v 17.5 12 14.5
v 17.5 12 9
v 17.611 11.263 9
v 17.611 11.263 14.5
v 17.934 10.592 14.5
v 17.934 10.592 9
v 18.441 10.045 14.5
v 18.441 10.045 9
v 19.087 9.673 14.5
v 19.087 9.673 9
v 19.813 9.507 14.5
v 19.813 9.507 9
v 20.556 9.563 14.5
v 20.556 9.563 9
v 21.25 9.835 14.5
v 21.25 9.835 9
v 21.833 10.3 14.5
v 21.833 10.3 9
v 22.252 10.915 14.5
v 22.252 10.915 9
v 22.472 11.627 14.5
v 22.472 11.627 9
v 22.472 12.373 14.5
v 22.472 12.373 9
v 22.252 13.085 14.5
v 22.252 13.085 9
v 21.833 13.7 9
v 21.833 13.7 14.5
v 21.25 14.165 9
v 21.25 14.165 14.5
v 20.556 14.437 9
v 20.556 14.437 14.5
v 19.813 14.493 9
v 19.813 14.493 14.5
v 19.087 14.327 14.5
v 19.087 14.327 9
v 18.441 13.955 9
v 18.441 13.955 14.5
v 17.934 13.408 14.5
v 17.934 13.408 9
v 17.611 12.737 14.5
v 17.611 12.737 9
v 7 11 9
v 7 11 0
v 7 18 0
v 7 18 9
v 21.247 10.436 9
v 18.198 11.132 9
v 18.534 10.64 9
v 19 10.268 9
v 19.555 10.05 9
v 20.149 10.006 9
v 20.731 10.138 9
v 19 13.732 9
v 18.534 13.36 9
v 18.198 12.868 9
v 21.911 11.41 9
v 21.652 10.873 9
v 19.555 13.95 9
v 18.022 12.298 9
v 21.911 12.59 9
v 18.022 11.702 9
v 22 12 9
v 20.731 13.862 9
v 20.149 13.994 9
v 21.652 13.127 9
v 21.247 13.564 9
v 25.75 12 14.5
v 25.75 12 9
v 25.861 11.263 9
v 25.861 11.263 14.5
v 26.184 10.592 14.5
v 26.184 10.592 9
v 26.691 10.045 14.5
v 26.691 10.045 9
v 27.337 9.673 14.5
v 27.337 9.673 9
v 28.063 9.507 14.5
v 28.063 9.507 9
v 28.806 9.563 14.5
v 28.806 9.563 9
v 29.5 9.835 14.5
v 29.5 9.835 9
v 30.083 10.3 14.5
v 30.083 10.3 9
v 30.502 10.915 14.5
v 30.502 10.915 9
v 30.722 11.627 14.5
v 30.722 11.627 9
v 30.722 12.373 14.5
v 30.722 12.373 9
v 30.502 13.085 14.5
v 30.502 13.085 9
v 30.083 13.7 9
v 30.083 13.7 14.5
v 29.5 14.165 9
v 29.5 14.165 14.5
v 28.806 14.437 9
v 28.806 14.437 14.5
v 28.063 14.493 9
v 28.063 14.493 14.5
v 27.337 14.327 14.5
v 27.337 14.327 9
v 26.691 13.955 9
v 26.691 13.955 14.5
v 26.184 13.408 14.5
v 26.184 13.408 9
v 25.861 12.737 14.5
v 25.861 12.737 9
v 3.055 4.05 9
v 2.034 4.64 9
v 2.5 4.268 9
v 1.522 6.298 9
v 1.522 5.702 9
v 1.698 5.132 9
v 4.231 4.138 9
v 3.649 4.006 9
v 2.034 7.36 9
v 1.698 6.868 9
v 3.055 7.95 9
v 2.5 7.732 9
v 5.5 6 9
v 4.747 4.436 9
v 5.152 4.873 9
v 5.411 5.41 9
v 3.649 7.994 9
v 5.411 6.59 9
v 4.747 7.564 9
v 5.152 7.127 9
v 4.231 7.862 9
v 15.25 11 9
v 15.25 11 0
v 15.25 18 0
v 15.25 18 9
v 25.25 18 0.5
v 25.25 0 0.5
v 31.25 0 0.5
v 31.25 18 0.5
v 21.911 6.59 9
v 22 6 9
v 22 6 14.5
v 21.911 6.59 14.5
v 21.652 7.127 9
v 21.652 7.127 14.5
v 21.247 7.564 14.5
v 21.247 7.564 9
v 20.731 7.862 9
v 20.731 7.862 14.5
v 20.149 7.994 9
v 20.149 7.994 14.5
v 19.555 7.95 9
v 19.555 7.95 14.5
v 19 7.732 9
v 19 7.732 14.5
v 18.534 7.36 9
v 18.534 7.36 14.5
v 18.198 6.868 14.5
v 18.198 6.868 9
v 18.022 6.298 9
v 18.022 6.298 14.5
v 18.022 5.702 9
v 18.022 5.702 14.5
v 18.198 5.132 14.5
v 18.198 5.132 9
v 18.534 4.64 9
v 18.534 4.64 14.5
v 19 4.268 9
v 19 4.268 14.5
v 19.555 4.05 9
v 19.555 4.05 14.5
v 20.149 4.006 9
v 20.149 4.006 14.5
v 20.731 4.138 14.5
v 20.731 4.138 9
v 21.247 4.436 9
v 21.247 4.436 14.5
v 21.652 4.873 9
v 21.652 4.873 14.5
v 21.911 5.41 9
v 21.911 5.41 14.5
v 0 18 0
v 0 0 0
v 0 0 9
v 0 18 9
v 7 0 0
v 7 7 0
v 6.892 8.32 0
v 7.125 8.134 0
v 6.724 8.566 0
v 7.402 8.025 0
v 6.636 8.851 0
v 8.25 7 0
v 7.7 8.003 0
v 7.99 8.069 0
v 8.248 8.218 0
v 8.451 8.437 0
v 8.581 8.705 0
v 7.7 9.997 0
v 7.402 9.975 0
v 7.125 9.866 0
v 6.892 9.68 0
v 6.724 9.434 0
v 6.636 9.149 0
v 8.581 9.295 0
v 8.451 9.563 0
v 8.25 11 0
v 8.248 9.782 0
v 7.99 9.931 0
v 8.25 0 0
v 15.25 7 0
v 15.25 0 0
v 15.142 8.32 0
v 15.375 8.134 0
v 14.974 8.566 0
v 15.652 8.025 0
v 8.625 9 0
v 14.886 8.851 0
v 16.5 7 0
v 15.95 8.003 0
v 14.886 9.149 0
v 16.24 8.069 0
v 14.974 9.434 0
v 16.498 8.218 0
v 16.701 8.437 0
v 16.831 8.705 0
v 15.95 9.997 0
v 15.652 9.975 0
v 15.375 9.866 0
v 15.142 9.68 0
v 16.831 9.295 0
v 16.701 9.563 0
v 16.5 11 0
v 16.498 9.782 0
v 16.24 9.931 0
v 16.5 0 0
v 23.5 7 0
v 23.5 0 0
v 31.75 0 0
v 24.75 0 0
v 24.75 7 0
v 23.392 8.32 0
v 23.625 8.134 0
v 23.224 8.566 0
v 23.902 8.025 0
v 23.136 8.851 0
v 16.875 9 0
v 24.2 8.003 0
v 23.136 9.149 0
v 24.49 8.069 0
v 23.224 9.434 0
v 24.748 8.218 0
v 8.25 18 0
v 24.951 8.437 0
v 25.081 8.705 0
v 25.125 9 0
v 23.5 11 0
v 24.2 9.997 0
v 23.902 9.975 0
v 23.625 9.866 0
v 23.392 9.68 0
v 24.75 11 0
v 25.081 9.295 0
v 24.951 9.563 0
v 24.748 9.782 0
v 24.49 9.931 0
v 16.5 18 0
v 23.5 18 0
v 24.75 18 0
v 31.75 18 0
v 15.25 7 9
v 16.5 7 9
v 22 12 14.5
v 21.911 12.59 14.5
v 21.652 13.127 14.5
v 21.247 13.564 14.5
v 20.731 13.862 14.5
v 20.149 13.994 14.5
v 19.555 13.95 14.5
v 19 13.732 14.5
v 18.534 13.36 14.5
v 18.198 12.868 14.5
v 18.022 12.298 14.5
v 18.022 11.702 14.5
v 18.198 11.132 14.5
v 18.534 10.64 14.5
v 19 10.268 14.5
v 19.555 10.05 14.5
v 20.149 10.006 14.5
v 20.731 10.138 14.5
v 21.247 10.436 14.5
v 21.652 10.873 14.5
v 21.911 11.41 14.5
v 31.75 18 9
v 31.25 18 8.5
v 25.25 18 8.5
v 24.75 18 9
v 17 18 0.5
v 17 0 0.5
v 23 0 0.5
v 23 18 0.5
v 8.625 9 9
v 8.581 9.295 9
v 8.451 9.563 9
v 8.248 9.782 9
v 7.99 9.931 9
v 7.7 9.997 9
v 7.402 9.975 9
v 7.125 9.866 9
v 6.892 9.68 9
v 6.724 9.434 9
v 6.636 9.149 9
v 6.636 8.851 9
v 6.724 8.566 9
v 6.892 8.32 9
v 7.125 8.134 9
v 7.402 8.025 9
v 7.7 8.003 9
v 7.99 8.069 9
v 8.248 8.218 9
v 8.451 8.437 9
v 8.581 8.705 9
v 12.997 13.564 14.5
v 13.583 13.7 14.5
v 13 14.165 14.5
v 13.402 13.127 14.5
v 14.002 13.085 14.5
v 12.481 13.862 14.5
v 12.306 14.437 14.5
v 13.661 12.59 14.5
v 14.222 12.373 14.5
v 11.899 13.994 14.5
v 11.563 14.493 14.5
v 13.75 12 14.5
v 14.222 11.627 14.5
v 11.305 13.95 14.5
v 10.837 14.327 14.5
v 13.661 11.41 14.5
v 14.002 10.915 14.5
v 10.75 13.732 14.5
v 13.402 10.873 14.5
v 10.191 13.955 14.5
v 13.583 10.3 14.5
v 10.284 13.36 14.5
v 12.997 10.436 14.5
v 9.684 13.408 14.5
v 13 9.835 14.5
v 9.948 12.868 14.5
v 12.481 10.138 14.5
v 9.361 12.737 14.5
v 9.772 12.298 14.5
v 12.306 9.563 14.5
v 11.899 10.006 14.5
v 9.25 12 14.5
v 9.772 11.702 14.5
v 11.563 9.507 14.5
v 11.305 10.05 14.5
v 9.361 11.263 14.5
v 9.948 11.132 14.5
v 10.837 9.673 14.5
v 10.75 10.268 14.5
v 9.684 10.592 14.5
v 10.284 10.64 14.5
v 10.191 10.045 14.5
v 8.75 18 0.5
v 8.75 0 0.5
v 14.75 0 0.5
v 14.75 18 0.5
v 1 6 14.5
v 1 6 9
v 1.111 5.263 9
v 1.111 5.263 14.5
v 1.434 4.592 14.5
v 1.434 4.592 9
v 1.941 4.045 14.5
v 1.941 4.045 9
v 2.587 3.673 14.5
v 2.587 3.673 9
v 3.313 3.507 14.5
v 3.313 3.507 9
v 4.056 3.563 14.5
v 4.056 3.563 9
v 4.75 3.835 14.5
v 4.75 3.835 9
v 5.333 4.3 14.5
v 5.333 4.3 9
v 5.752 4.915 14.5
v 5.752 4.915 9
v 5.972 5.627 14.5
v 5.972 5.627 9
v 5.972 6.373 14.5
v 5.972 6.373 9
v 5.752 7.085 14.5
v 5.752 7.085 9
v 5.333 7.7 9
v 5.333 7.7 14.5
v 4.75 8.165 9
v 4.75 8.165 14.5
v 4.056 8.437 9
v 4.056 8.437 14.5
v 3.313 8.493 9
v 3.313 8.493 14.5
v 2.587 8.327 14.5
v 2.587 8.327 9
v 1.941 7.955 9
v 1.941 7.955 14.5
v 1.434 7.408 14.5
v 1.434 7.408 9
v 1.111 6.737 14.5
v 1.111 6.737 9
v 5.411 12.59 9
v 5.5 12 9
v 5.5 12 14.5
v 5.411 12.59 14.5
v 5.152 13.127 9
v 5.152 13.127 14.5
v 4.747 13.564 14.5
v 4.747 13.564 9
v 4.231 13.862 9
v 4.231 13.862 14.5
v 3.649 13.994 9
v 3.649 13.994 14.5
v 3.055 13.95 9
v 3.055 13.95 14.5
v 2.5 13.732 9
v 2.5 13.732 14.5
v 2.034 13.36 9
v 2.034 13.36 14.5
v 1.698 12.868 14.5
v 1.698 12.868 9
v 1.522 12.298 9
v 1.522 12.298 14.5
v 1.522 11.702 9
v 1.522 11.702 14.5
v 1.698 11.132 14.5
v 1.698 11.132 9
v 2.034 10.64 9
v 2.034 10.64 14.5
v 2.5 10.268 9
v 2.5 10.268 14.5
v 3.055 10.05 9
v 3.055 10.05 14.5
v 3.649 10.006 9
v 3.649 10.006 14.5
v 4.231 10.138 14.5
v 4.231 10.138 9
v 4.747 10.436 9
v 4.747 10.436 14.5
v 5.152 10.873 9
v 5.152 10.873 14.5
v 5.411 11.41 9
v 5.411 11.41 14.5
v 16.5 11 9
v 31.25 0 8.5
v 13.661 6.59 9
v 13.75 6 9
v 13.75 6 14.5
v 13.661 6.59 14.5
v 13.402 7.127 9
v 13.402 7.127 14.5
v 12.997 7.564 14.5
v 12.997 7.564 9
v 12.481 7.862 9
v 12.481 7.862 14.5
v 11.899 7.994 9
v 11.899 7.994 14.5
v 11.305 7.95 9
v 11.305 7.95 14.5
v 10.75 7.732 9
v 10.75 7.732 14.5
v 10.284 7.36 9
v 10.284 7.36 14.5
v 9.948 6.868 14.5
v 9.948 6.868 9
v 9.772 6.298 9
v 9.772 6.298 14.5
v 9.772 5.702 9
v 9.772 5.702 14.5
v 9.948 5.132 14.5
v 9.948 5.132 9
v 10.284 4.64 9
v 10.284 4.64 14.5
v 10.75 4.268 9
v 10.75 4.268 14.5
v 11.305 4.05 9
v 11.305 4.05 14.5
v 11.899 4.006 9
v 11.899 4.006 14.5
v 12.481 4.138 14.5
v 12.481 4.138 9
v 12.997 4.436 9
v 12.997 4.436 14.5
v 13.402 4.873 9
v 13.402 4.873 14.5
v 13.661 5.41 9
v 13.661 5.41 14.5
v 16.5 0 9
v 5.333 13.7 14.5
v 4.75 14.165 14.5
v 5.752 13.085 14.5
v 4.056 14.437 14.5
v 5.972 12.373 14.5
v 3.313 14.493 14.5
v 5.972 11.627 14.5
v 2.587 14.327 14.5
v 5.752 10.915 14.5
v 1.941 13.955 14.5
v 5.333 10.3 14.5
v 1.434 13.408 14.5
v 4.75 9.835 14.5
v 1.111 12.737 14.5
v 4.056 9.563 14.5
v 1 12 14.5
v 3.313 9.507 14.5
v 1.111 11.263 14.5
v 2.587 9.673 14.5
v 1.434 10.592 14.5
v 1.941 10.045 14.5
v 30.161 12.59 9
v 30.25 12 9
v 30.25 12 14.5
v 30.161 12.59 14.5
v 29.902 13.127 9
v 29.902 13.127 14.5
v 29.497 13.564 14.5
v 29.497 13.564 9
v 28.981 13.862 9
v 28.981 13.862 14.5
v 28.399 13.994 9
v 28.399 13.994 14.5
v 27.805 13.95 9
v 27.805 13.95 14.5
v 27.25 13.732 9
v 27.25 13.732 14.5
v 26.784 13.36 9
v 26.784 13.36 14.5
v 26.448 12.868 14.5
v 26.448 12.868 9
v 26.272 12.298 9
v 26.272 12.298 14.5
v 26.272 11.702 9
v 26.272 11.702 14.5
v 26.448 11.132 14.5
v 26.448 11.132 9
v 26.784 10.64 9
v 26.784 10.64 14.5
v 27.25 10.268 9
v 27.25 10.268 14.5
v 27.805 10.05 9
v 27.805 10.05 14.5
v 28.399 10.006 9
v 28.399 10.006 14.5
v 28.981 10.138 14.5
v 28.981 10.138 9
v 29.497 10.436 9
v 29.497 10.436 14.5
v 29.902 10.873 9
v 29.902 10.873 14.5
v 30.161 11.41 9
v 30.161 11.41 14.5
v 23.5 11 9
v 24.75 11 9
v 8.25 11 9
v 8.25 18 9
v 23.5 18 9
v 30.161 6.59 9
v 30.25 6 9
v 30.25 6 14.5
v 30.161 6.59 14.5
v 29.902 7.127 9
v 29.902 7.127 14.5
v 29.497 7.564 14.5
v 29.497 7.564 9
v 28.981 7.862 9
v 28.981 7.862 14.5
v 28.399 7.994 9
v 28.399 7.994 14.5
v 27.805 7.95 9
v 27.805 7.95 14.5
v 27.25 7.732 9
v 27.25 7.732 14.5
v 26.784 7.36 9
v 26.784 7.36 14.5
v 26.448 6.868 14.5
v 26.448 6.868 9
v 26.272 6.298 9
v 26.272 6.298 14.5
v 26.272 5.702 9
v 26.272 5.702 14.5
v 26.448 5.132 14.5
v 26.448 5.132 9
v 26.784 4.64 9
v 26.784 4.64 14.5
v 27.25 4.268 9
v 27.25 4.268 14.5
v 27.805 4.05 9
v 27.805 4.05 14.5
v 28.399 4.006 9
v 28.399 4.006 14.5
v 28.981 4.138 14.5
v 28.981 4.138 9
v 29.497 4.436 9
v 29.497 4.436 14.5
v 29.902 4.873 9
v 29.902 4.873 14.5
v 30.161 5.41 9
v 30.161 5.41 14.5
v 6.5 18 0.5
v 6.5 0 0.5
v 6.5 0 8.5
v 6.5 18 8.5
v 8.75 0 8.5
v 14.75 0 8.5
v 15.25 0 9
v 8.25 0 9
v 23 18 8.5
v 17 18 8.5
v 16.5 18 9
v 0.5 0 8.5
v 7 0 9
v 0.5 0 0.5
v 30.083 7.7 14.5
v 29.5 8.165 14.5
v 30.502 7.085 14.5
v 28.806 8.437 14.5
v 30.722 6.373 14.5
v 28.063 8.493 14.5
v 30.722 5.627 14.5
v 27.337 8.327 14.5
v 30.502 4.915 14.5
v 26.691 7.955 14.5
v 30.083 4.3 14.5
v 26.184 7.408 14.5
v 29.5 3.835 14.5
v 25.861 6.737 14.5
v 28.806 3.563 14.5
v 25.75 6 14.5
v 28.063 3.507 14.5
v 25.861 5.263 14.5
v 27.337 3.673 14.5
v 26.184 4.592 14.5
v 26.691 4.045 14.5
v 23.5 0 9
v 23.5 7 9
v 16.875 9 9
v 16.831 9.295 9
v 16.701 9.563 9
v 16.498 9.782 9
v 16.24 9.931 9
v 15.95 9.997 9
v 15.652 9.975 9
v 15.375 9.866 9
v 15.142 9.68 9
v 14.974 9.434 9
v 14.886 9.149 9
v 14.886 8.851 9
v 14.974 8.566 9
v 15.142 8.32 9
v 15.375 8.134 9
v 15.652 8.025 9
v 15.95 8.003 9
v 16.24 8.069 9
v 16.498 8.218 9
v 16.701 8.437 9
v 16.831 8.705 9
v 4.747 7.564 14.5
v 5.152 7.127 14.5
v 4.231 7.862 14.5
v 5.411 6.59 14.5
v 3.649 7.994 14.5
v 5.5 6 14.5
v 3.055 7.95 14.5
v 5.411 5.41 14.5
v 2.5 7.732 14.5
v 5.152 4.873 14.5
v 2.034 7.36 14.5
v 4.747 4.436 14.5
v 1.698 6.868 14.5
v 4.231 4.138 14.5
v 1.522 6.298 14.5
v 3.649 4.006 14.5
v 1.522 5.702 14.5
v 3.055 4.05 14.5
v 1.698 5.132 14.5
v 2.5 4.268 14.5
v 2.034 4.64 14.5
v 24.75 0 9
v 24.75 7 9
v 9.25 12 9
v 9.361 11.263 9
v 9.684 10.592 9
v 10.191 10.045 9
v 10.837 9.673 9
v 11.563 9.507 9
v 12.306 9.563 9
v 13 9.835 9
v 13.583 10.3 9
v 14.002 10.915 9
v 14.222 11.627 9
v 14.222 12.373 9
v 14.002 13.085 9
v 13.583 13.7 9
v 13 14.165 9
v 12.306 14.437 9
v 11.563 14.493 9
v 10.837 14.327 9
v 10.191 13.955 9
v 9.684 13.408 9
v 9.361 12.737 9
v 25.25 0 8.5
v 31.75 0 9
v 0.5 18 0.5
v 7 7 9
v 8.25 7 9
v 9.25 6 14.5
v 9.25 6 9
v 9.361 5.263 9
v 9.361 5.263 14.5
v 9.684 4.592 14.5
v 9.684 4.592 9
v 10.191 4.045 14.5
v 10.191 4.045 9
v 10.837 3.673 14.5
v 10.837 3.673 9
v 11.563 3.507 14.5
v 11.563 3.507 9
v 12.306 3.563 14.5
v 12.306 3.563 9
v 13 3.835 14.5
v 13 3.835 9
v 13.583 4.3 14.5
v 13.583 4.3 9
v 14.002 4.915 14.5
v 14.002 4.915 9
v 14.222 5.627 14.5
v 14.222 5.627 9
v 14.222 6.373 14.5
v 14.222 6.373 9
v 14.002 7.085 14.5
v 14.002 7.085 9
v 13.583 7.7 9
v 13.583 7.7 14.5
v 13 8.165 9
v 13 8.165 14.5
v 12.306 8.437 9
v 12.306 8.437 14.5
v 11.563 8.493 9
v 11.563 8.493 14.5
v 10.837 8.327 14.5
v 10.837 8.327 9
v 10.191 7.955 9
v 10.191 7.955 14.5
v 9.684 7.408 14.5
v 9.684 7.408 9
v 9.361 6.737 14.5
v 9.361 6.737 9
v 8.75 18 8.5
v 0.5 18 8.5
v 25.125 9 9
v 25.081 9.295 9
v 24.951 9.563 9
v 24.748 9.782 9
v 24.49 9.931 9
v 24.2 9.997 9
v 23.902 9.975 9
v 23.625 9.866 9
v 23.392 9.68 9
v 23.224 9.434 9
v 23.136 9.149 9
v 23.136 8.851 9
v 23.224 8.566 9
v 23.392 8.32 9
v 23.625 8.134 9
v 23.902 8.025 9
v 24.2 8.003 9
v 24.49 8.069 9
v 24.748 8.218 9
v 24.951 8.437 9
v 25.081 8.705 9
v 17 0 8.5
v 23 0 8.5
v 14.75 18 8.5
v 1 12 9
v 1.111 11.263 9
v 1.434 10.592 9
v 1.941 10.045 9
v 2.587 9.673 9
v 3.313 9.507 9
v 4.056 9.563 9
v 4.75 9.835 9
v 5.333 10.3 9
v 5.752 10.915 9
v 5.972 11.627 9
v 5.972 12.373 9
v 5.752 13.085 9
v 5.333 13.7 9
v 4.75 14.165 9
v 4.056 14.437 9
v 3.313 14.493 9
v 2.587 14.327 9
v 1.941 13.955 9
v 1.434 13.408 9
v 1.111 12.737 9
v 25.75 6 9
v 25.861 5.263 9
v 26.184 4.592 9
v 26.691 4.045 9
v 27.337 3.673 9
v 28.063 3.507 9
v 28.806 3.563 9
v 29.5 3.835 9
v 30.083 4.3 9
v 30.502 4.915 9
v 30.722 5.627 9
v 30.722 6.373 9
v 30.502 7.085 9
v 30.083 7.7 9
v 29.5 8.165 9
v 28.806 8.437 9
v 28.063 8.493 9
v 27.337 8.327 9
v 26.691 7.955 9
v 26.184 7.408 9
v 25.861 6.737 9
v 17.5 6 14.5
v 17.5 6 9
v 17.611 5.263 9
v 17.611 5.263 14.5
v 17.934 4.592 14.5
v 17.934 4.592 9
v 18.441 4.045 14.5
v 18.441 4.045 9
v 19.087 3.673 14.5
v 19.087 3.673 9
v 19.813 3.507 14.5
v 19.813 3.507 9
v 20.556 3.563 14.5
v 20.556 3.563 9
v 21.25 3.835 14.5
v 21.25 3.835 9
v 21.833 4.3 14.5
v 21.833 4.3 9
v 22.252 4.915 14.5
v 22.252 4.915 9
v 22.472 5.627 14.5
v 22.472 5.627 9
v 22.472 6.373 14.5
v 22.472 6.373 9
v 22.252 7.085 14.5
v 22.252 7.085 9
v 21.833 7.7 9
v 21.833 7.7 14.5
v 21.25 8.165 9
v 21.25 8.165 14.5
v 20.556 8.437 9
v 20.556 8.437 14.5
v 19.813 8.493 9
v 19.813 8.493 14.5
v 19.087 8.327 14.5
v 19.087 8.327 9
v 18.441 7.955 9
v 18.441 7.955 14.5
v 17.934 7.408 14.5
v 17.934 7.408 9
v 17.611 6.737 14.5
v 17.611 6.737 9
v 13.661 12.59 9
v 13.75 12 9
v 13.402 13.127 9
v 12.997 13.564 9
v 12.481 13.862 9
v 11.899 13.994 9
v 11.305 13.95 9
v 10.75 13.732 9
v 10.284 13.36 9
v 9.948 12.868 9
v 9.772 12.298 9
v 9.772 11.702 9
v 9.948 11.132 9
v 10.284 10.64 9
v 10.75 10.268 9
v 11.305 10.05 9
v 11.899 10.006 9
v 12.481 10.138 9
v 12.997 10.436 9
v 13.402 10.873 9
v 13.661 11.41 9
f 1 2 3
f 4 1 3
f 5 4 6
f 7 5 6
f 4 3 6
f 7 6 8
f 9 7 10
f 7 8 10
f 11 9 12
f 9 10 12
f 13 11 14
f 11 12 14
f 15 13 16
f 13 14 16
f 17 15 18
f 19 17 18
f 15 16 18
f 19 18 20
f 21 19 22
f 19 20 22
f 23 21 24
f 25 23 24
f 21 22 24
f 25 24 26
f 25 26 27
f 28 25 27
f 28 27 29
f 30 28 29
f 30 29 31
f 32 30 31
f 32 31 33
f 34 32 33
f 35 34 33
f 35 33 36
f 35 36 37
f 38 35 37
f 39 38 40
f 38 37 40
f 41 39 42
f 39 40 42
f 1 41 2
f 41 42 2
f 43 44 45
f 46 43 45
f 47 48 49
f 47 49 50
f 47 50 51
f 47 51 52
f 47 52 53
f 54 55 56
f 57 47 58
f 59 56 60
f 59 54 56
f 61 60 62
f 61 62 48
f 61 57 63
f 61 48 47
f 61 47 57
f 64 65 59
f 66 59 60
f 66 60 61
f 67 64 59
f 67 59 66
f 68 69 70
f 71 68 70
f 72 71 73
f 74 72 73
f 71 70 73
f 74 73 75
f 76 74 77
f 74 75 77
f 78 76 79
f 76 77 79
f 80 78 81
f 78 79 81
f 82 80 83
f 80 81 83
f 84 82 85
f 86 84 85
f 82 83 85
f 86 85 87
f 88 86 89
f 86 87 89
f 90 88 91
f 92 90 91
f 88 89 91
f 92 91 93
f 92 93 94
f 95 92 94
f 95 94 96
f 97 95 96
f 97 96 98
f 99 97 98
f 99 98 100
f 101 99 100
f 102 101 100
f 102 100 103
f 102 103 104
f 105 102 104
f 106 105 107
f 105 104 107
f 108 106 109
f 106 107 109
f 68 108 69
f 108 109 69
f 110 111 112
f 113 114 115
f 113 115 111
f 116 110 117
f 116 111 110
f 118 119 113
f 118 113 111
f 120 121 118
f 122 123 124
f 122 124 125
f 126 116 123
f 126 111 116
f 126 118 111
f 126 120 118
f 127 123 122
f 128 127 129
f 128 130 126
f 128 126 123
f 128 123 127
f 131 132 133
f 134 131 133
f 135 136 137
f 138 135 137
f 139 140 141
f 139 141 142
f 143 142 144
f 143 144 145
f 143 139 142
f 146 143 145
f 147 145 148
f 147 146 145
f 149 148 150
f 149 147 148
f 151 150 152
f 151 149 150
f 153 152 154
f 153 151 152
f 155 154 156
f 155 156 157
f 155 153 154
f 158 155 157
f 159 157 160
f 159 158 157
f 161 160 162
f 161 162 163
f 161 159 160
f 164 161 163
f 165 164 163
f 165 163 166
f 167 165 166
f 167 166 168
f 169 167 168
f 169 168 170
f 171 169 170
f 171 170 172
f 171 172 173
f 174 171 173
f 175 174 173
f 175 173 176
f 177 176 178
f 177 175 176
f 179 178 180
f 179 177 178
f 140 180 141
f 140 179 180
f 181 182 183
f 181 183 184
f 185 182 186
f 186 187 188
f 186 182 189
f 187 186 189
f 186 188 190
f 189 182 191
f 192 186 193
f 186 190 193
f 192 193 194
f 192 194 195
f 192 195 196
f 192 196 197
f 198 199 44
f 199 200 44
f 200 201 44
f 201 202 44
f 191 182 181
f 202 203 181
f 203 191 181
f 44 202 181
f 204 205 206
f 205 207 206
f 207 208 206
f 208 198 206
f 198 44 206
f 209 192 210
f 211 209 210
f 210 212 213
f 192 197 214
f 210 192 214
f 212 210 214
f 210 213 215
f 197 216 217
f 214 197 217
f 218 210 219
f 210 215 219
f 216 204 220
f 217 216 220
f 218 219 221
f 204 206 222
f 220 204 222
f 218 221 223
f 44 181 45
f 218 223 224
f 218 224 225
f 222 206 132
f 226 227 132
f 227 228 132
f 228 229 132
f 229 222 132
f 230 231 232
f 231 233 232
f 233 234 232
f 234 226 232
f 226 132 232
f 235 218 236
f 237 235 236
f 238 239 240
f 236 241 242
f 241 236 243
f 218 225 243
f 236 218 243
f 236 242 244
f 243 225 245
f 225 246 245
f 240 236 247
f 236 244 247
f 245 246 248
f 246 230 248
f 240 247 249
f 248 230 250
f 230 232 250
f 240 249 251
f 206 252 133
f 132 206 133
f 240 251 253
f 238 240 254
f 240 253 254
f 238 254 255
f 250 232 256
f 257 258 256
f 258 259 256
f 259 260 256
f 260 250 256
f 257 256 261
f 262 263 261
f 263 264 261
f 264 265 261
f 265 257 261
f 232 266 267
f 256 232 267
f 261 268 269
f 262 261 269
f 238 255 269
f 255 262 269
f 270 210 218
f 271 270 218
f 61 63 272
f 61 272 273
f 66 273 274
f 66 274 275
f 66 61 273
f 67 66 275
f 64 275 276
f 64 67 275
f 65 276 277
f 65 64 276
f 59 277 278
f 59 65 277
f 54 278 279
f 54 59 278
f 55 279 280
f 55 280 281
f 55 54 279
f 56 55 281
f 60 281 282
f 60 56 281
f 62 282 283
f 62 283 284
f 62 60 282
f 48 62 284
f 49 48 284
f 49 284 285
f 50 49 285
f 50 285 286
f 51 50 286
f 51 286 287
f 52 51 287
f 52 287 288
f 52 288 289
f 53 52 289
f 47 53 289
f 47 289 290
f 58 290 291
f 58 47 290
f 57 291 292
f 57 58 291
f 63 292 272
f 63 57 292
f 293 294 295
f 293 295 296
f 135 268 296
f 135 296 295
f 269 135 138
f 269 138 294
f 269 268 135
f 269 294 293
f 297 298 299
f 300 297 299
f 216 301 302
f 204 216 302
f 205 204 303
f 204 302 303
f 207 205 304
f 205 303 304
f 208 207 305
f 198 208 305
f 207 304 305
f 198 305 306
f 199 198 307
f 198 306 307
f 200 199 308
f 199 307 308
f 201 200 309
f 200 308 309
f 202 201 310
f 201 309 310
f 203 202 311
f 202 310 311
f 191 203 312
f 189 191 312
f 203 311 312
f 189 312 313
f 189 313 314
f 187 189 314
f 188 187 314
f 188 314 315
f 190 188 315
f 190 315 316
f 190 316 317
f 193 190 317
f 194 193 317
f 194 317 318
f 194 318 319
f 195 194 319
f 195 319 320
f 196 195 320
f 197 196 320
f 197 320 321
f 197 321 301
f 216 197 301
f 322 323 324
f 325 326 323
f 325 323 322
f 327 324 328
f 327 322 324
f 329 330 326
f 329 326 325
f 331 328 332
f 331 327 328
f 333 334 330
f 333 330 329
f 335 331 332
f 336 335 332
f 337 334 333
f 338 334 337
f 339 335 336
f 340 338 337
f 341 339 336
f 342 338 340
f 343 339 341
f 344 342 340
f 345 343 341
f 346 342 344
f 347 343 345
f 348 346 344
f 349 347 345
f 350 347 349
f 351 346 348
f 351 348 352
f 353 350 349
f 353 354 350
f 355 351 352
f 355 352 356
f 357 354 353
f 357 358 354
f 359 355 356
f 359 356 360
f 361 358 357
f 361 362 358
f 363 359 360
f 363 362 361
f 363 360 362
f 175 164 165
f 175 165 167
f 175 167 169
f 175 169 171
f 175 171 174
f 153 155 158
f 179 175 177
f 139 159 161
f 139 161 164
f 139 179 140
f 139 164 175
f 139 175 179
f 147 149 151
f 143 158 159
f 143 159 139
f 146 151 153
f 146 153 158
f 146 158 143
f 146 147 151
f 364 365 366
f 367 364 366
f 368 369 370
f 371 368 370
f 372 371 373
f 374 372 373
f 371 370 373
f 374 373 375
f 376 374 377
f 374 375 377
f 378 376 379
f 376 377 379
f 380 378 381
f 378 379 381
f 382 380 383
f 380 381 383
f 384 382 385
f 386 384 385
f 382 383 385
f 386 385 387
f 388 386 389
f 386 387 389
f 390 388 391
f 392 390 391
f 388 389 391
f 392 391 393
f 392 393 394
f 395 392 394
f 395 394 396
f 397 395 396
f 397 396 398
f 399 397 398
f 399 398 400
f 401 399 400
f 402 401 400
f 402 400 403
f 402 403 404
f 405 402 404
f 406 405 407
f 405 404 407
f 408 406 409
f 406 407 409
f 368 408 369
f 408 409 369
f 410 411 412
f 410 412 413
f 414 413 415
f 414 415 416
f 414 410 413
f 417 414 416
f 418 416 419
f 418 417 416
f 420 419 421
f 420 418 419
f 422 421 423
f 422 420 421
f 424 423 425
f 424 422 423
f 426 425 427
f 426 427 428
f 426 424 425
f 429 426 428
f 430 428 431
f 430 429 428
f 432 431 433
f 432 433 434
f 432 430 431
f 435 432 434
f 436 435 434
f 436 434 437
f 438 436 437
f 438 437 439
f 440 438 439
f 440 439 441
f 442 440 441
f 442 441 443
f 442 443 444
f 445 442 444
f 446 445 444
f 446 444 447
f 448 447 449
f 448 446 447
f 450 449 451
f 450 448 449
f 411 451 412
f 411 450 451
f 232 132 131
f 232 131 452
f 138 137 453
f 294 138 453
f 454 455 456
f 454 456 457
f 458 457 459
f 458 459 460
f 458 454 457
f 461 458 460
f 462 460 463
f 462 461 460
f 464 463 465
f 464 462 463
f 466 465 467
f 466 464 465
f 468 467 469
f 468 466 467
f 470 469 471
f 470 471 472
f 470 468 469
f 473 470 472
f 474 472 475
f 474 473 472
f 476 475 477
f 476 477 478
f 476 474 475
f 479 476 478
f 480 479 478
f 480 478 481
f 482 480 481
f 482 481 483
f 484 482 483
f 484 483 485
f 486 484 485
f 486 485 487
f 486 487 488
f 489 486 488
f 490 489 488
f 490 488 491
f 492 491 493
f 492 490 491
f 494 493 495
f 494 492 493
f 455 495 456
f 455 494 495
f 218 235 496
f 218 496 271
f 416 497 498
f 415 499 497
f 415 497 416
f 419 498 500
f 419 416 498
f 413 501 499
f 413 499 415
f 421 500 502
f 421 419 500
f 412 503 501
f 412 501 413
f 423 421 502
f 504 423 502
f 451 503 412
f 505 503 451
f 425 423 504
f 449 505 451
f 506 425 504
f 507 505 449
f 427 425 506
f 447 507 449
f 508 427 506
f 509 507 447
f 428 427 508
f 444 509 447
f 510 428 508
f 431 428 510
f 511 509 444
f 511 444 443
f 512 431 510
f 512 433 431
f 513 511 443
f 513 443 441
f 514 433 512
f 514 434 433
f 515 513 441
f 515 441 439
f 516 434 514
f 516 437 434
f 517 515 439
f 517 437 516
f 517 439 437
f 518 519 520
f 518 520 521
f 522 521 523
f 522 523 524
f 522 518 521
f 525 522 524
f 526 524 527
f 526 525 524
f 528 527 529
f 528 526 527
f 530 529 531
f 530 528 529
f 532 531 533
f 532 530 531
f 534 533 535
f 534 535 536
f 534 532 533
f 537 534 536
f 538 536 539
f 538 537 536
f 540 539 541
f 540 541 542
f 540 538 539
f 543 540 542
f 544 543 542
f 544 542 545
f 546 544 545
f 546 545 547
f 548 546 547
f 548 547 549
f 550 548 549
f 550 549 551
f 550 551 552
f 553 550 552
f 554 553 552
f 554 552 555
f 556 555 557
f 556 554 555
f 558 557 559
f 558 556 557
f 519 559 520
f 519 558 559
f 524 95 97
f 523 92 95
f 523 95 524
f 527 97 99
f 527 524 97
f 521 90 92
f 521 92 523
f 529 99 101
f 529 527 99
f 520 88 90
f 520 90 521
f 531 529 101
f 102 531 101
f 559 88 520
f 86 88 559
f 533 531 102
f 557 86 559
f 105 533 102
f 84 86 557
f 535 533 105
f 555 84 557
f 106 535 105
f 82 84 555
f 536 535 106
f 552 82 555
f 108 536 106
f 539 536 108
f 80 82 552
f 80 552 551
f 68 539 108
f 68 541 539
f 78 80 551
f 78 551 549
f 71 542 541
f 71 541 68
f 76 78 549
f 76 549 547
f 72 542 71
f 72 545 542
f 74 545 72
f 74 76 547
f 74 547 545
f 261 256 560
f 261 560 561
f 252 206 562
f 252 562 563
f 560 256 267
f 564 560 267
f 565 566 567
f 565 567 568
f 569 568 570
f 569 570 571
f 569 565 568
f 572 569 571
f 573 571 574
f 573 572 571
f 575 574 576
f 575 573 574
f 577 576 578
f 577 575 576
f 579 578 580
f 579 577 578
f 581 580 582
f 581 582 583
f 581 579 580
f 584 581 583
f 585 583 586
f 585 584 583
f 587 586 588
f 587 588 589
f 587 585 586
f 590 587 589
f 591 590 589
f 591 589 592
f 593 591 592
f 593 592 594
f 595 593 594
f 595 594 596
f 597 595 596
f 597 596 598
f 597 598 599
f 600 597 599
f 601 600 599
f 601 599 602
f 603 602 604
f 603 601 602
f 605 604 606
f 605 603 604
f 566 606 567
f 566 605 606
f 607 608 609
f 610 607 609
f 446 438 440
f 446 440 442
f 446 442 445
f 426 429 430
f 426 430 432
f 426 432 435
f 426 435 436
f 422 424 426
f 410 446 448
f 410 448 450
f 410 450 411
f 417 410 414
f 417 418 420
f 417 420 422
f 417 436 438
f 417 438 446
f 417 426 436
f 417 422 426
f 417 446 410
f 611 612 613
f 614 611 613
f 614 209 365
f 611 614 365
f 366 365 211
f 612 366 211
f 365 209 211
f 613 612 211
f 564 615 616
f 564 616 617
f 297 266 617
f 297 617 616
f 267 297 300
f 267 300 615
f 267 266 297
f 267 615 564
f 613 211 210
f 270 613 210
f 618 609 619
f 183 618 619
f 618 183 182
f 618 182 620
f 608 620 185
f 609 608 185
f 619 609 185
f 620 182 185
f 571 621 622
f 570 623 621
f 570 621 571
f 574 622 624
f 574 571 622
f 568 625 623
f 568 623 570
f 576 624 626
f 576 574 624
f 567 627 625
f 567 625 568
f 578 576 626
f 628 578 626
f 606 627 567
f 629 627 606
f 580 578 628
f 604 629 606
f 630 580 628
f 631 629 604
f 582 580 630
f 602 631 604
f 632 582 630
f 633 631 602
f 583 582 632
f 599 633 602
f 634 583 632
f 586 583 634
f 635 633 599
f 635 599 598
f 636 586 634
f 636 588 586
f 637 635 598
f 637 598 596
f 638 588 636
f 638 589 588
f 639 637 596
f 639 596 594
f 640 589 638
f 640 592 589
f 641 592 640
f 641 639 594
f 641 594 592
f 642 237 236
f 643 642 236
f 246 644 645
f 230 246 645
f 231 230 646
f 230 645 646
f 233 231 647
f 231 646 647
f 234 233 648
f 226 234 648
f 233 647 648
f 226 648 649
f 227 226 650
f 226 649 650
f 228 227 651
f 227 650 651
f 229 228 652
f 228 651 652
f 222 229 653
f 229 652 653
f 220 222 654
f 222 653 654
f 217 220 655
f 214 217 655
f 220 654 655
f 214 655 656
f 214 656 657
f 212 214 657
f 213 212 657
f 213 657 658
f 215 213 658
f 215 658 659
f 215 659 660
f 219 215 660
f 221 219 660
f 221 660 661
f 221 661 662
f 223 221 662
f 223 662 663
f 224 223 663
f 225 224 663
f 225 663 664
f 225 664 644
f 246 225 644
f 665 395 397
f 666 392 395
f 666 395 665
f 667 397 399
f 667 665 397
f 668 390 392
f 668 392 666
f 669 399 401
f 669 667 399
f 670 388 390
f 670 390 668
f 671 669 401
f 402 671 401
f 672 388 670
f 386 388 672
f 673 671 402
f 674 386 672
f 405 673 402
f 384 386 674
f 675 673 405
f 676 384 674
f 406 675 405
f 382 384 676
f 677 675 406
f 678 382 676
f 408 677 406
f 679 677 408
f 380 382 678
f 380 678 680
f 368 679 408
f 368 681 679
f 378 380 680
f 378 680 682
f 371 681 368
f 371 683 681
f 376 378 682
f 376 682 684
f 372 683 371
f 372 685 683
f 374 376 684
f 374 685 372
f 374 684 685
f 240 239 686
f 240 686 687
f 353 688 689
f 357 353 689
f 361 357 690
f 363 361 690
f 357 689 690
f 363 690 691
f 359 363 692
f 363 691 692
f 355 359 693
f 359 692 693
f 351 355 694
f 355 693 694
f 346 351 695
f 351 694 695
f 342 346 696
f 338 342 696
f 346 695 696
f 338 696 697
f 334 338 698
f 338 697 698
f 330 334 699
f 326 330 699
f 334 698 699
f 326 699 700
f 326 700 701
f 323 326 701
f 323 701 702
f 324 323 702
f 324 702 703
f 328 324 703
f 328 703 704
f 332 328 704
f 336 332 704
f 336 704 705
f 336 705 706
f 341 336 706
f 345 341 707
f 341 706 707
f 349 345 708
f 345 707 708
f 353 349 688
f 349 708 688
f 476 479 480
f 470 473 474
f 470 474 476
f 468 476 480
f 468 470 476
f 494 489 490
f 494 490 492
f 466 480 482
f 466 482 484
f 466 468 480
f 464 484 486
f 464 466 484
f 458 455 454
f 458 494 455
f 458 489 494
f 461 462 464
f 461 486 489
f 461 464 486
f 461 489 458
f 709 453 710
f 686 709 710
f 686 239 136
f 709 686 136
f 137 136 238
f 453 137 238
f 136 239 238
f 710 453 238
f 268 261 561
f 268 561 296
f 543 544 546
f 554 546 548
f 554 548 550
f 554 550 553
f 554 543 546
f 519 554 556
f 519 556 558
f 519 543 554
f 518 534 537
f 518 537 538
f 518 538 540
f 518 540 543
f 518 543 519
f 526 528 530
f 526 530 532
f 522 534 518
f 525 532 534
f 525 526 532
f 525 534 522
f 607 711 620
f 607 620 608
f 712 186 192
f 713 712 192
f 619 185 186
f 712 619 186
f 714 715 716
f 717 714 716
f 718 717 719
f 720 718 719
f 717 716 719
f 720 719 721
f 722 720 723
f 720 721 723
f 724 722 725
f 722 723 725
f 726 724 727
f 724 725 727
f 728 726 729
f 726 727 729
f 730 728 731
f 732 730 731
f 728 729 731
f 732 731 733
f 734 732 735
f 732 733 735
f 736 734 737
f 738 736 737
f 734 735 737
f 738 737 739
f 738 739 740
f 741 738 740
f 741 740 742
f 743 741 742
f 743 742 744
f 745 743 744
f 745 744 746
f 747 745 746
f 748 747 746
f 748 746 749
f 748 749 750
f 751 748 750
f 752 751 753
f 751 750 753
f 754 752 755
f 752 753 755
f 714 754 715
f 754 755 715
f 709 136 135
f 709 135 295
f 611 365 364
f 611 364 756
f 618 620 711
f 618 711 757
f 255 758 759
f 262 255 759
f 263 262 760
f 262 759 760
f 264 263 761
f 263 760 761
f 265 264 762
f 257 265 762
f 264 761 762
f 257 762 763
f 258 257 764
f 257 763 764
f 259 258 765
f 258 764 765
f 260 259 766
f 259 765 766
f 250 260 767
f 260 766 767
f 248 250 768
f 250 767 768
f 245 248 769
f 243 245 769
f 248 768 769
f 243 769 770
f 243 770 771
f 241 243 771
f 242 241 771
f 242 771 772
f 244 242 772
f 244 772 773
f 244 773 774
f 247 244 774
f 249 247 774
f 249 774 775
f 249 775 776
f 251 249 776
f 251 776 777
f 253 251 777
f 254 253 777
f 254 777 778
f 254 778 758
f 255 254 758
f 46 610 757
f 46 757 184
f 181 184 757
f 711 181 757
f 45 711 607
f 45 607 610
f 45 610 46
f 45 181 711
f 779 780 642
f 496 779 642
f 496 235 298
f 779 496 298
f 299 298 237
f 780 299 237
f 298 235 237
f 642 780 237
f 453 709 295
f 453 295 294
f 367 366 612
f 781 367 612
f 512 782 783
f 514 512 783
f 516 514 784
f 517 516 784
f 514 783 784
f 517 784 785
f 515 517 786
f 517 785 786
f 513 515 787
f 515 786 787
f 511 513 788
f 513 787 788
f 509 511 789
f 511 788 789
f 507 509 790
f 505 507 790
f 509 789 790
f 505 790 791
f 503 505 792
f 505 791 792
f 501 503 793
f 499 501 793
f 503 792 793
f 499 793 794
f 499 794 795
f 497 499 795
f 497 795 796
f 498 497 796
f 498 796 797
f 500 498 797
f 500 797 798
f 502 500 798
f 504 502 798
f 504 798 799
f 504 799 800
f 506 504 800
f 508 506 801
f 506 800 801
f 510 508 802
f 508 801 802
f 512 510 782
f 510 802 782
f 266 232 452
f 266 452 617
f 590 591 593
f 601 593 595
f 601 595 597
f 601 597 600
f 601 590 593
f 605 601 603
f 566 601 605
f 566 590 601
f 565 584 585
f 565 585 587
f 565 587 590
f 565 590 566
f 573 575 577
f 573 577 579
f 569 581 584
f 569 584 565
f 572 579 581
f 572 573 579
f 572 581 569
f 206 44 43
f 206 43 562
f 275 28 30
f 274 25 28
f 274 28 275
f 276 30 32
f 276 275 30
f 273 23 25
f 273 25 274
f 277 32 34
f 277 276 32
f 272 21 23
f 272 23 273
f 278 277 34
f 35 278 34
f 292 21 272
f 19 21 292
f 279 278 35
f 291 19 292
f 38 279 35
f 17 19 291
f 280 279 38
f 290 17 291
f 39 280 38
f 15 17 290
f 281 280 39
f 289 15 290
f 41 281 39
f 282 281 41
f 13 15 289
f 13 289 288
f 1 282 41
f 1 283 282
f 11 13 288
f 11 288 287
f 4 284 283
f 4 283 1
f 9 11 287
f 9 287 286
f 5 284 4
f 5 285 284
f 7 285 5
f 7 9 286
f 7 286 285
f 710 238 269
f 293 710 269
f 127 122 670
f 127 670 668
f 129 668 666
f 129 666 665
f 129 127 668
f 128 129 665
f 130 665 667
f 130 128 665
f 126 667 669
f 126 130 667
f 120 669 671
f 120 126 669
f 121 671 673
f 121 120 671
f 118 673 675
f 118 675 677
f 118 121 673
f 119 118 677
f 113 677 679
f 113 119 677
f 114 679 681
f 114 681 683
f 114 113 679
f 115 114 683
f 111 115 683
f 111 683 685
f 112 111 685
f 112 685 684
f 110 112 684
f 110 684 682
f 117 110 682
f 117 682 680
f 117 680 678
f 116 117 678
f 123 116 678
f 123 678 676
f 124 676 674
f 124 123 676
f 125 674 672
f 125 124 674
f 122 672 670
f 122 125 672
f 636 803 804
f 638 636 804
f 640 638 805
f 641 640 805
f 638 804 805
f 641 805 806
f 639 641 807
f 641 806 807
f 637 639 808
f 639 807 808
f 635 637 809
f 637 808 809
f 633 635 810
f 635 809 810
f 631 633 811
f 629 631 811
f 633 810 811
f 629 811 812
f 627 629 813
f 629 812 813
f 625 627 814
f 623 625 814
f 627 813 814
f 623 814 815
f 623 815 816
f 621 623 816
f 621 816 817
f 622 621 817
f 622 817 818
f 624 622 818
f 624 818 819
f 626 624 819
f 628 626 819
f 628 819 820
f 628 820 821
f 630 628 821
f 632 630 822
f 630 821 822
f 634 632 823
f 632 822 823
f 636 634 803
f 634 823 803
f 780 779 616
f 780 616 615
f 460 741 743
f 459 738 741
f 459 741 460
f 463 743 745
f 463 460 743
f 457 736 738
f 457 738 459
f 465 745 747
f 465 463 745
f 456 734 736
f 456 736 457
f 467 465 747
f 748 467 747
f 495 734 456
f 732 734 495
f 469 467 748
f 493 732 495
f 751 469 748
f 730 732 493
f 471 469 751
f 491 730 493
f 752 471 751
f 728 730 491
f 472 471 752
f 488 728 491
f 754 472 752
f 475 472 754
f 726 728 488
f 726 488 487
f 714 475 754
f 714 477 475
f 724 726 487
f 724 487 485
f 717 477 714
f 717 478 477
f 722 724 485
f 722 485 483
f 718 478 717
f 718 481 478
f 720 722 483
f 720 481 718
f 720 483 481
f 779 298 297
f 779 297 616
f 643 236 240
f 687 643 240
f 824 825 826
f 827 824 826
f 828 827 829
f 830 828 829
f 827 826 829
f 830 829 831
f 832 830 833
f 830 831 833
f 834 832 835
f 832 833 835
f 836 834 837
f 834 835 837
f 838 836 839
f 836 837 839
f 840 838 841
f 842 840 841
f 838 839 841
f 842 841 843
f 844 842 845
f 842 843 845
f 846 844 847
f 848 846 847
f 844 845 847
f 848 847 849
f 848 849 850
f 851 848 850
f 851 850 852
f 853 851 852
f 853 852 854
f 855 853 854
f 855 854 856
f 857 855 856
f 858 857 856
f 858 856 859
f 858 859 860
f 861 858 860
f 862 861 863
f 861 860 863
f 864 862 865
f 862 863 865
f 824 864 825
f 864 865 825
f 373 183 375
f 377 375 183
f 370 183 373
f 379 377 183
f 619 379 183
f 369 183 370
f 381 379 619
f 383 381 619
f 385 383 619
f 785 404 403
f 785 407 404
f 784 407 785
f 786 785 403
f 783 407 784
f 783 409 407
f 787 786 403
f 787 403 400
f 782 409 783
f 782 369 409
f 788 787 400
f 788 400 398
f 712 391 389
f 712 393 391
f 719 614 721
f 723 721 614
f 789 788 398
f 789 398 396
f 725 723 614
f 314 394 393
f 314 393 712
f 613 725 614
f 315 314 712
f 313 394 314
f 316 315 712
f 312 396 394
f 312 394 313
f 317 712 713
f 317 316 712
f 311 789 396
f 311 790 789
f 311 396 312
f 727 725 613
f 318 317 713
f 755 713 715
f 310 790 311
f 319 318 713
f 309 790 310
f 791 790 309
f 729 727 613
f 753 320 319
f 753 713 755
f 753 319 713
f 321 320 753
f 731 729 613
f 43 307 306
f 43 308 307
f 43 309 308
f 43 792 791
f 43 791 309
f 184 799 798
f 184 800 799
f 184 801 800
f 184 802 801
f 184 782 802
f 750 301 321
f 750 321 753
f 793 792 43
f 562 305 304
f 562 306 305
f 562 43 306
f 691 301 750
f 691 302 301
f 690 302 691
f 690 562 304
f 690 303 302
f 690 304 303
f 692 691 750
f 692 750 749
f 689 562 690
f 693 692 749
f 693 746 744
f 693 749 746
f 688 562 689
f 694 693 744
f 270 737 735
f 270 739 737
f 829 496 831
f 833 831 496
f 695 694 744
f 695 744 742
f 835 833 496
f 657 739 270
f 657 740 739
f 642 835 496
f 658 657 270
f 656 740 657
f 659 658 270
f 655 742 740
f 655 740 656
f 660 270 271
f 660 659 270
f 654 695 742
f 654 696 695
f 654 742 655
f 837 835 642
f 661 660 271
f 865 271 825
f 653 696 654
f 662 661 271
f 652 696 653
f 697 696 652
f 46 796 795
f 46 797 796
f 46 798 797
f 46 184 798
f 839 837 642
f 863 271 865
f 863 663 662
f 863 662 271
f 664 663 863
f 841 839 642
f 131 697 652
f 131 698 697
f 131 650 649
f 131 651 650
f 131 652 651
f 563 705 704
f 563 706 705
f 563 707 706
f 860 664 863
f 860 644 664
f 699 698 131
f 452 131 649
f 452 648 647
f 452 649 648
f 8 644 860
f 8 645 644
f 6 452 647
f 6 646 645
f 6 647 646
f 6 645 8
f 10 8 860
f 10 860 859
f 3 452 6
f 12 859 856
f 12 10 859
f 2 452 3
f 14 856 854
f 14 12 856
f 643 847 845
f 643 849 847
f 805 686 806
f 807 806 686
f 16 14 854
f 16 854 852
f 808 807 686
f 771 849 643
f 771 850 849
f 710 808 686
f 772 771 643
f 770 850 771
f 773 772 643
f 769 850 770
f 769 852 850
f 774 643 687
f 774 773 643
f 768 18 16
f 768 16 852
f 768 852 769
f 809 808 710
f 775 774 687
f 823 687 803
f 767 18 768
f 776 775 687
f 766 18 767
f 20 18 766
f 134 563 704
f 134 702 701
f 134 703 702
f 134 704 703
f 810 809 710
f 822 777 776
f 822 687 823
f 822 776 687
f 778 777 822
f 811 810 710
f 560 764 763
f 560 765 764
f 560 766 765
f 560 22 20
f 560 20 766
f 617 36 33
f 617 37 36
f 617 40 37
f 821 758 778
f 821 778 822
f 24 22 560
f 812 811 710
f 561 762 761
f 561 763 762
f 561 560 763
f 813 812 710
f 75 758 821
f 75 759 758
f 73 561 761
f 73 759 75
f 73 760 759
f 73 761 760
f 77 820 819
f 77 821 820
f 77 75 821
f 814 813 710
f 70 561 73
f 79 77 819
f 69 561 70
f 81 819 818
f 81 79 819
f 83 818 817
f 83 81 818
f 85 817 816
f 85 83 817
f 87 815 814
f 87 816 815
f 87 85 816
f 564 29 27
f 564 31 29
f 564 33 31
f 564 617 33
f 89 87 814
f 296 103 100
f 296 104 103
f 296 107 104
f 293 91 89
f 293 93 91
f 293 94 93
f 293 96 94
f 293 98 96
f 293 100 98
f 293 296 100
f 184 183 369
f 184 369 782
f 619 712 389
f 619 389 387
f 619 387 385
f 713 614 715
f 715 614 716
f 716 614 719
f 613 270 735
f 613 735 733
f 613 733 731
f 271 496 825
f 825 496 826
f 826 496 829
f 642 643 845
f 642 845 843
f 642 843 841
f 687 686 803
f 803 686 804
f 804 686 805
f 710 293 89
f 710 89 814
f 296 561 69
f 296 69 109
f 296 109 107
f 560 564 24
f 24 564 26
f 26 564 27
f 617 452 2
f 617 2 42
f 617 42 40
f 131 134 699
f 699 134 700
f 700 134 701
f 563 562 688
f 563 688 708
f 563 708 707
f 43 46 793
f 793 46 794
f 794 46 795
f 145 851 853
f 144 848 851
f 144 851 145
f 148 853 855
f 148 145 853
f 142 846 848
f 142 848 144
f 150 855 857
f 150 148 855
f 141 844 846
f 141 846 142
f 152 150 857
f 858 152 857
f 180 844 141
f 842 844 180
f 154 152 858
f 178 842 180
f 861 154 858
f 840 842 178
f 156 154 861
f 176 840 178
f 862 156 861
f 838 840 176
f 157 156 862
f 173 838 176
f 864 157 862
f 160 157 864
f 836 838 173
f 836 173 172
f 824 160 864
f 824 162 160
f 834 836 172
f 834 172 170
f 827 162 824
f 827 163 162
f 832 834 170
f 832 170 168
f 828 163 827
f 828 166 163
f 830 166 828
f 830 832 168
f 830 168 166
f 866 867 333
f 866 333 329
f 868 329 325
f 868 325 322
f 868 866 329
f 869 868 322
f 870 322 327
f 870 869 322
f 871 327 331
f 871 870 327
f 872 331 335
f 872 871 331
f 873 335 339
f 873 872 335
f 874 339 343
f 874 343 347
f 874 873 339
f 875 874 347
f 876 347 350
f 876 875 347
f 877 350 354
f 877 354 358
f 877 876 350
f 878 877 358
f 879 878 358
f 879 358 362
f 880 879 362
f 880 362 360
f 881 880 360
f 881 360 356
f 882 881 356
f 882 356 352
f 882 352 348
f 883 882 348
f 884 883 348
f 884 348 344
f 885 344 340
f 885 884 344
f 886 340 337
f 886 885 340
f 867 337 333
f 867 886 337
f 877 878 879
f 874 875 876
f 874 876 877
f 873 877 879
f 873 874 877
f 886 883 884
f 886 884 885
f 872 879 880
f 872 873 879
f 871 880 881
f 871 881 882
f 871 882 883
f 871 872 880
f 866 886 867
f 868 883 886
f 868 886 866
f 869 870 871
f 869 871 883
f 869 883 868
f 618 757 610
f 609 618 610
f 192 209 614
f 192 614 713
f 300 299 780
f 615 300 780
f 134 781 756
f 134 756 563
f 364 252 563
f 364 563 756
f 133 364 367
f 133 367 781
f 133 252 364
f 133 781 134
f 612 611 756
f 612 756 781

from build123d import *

# Parameters (mm, degrees)
CROQUIS1_W                = 7
CROQUIS1_H                = 18
SALIENTE_EXTRUIR1_DEPTH   = 9
SALIENTE_EXTRUIR1_2_DEPTH = 9
SALIENTE_EXTRUIR1_3_DEPTH = 9
SALIENTE_EXTRUIR1_4_DEPTH = 9
CROQUIS2_W                = 24.75
CROQUIS2_H                = 4
SALIENTE_EXTRUIR2_DEPTH   = 9
CROQUIS3_R                = 2.5
CROQUIS3_R_2              = 2
SALIENTE_EXTRUIR3_DEPTH   = 5.5
CROQUIS4_R                = 1
CORTAR_EXTRUIR1_DEPTH     = 38.59072359
CROQUIS5_W                = 6
CROQUIS5_H                = 8
CORTAR_EXTRUIR2_DEPTH     = 40.272286666


with BuildPart() as part:
    # Croquis1 → Saliente-Extruir1 (new body)
    with BuildSketch(Plane.XY):
        with Locations((11.75, 9)):
            Rectangle(CROQUIS1_W, CROQUIS1_H)
    extrude(amount=SALIENTE_EXTRUIR1_DEPTH)



with BuildPart() as body_2:
    # Croquis1 → Saliente-Extruir1 2 (new body)
    with BuildSketch(Plane.XY):
        with Locations((3.5, 9)):
            Rectangle(CROQUIS1_W, CROQUIS1_H)
    extrude(amount=SALIENTE_EXTRUIR1_2_DEPTH)


with BuildPart() as body_3:
    # Croquis1 → Saliente-Extruir1 3 (new body)
    with BuildSketch(Plane.XY):
        with Locations((20, 9)):
            Rectangle(CROQUIS1_W, CROQUIS1_H)
    extrude(amount=SALIENTE_EXTRUIR1_3_DEPTH)


with BuildPart() as body_4:
    # Croquis1 → Saliente-Extruir1 4 (new body)
    with BuildSketch(Plane.XY):
        with Locations((28.25, 9)):
            Rectangle(CROQUIS1_W, CROQUIS1_H)
    extrude(amount=SALIENTE_EXTRUIR1_4_DEPTH)


with BuildPart() as part_1:
    add(part.part)

    add(body_2.part)  # Saliente-Extruir2 merges body 2

    add(body_3.part)  # Saliente-Extruir2 merges body 3

    add(body_4.part)  # Saliente-Extruir2 merges body 4
    # Croquis2 → Saliente-Extruir2 (add)
    with BuildSketch(Plane.XY):
        with Locations((12.375, 9)):
            Rectangle(CROQUIS2_W, CROQUIS2_H)
    extrude(amount=SALIENTE_EXTRUIR2_DEPTH)

    # Croquis3 → Saliente-Extruir3 (add)
    # profile 1 of 8: a face of its own
    with BuildSketch(Plane.XY.offset(9)):
        with Locations(Location((3.5, 12, 0), (0, 0, 180))):
            Circle(CROQUIS3_R)
        with Locations((3.5, 12)):
            Circle(CROQUIS3_R_2, mode=Mode.SUBTRACT)
    # profile 2 of 8: a face of its own
    with BuildSketch(Plane.XY.offset(9)):
        with Locations(Location((11.75, 12, 0), (0, 0, 180))):
            Circle(CROQUIS3_R)
        with Locations((11.75, 12)):
            Circle(CROQUIS3_R_2, mode=Mode.SUBTRACT)
    # profile 3 of 8: a face of its own
    with BuildSketch(Plane.XY.offset(9)):
        with Locations(Location((20, 12, 0), (0, 0, 180))):
            Circle(CROQUIS3_R)
        with Locations((20, 12)):
            Circle(CROQUIS3_R_2, mode=Mode.SUBTRACT)
    # profile 4 of 8: a face of its own
    with BuildSketch(Plane.XY.offset(9)):
        with Locations(Location((28.25, 12, 0), (0, 0, 180))):
            Circle(CROQUIS3_R)
        with Locations((28.25, 12)):
            Circle(CROQUIS3_R_2, mode=Mode.SUBTRACT)
    # profile 5 of 8: a face of its own
    with BuildSketch(Plane.XY.offset(9)):
        with Locations(Location((11.75, 6, 0), (0, 0, 180))):
            Circle(CROQUIS3_R)
        with Locations((11.75, 6)):
            Circle(CROQUIS3_R_2, mode=Mode.SUBTRACT)
    # profile 6 of 8: a face of its own
    with BuildSketch(Plane.XY.offset(9)):
        with Locations(Location((20, 6, 0), (0, 0, 180))):
            Circle(CROQUIS3_R)
        with Locations((20, 6)):
            Circle(CROQUIS3_R_2, mode=Mode.SUBTRACT)
    # profile 7 of 8: a face of its own
    with BuildSketch(Plane.XY.offset(9)):
        with Locations(Location((28.25, 6, 0), (0, 0, 180))):
            Circle(CROQUIS3_R)
        with Locations((28.25, 6)):
            Circle(CROQUIS3_R_2, mode=Mode.SUBTRACT)
    # profile 8 of 8: a face of its own
    with BuildSketch(Plane.XY.offset(9)):
        with Locations(Location((3.5, 6, 0), (0, 0, 180))):
            Circle(CROQUIS3_R)
        with Locations((3.5, 6)):
            Circle(CROQUIS3_R_2, mode=Mode.SUBTRACT)
    extrude(amount=SALIENTE_EXTRUIR3_DEPTH)

    # Croquis4 → Cortar-Extruir1 (cut, through all)
    with BuildSketch(Plane.XY.offset(9)):
        with Locations((7.625, 9)):
            Circle(CROQUIS4_R)
        with Locations((15.875, 9)):
            Circle(CROQUIS4_R)
        with Locations((24.125, 9)):
            Circle(CROQUIS4_R)
    extrude(amount=-CORTAR_EXTRUIR1_DEPTH, mode=Mode.SUBTRACT)

    # Croquis5 → Cortar-Extruir2 (cut, through all)
    with BuildSketch(Plane.XZ):
        with Locations((3.5, 4.5)):
            Rectangle(CROQUIS5_W, CROQUIS5_H)
        with Locations((11.75, 4.5)):
            Rectangle(CROQUIS5_W, CROQUIS5_H)
        with Locations((20, 4.5)):
            Rectangle(CROQUIS5_W, CROQUIS5_H)
        with Locations((28.25, 4.5)):
            Rectangle(CROQUIS5_W, CROQUIS5_H)
    extrude(amount=-CORTAR_EXTRUIR2_DEPTH, mode=Mode.SUBTRACT)


solid = part_1.part
